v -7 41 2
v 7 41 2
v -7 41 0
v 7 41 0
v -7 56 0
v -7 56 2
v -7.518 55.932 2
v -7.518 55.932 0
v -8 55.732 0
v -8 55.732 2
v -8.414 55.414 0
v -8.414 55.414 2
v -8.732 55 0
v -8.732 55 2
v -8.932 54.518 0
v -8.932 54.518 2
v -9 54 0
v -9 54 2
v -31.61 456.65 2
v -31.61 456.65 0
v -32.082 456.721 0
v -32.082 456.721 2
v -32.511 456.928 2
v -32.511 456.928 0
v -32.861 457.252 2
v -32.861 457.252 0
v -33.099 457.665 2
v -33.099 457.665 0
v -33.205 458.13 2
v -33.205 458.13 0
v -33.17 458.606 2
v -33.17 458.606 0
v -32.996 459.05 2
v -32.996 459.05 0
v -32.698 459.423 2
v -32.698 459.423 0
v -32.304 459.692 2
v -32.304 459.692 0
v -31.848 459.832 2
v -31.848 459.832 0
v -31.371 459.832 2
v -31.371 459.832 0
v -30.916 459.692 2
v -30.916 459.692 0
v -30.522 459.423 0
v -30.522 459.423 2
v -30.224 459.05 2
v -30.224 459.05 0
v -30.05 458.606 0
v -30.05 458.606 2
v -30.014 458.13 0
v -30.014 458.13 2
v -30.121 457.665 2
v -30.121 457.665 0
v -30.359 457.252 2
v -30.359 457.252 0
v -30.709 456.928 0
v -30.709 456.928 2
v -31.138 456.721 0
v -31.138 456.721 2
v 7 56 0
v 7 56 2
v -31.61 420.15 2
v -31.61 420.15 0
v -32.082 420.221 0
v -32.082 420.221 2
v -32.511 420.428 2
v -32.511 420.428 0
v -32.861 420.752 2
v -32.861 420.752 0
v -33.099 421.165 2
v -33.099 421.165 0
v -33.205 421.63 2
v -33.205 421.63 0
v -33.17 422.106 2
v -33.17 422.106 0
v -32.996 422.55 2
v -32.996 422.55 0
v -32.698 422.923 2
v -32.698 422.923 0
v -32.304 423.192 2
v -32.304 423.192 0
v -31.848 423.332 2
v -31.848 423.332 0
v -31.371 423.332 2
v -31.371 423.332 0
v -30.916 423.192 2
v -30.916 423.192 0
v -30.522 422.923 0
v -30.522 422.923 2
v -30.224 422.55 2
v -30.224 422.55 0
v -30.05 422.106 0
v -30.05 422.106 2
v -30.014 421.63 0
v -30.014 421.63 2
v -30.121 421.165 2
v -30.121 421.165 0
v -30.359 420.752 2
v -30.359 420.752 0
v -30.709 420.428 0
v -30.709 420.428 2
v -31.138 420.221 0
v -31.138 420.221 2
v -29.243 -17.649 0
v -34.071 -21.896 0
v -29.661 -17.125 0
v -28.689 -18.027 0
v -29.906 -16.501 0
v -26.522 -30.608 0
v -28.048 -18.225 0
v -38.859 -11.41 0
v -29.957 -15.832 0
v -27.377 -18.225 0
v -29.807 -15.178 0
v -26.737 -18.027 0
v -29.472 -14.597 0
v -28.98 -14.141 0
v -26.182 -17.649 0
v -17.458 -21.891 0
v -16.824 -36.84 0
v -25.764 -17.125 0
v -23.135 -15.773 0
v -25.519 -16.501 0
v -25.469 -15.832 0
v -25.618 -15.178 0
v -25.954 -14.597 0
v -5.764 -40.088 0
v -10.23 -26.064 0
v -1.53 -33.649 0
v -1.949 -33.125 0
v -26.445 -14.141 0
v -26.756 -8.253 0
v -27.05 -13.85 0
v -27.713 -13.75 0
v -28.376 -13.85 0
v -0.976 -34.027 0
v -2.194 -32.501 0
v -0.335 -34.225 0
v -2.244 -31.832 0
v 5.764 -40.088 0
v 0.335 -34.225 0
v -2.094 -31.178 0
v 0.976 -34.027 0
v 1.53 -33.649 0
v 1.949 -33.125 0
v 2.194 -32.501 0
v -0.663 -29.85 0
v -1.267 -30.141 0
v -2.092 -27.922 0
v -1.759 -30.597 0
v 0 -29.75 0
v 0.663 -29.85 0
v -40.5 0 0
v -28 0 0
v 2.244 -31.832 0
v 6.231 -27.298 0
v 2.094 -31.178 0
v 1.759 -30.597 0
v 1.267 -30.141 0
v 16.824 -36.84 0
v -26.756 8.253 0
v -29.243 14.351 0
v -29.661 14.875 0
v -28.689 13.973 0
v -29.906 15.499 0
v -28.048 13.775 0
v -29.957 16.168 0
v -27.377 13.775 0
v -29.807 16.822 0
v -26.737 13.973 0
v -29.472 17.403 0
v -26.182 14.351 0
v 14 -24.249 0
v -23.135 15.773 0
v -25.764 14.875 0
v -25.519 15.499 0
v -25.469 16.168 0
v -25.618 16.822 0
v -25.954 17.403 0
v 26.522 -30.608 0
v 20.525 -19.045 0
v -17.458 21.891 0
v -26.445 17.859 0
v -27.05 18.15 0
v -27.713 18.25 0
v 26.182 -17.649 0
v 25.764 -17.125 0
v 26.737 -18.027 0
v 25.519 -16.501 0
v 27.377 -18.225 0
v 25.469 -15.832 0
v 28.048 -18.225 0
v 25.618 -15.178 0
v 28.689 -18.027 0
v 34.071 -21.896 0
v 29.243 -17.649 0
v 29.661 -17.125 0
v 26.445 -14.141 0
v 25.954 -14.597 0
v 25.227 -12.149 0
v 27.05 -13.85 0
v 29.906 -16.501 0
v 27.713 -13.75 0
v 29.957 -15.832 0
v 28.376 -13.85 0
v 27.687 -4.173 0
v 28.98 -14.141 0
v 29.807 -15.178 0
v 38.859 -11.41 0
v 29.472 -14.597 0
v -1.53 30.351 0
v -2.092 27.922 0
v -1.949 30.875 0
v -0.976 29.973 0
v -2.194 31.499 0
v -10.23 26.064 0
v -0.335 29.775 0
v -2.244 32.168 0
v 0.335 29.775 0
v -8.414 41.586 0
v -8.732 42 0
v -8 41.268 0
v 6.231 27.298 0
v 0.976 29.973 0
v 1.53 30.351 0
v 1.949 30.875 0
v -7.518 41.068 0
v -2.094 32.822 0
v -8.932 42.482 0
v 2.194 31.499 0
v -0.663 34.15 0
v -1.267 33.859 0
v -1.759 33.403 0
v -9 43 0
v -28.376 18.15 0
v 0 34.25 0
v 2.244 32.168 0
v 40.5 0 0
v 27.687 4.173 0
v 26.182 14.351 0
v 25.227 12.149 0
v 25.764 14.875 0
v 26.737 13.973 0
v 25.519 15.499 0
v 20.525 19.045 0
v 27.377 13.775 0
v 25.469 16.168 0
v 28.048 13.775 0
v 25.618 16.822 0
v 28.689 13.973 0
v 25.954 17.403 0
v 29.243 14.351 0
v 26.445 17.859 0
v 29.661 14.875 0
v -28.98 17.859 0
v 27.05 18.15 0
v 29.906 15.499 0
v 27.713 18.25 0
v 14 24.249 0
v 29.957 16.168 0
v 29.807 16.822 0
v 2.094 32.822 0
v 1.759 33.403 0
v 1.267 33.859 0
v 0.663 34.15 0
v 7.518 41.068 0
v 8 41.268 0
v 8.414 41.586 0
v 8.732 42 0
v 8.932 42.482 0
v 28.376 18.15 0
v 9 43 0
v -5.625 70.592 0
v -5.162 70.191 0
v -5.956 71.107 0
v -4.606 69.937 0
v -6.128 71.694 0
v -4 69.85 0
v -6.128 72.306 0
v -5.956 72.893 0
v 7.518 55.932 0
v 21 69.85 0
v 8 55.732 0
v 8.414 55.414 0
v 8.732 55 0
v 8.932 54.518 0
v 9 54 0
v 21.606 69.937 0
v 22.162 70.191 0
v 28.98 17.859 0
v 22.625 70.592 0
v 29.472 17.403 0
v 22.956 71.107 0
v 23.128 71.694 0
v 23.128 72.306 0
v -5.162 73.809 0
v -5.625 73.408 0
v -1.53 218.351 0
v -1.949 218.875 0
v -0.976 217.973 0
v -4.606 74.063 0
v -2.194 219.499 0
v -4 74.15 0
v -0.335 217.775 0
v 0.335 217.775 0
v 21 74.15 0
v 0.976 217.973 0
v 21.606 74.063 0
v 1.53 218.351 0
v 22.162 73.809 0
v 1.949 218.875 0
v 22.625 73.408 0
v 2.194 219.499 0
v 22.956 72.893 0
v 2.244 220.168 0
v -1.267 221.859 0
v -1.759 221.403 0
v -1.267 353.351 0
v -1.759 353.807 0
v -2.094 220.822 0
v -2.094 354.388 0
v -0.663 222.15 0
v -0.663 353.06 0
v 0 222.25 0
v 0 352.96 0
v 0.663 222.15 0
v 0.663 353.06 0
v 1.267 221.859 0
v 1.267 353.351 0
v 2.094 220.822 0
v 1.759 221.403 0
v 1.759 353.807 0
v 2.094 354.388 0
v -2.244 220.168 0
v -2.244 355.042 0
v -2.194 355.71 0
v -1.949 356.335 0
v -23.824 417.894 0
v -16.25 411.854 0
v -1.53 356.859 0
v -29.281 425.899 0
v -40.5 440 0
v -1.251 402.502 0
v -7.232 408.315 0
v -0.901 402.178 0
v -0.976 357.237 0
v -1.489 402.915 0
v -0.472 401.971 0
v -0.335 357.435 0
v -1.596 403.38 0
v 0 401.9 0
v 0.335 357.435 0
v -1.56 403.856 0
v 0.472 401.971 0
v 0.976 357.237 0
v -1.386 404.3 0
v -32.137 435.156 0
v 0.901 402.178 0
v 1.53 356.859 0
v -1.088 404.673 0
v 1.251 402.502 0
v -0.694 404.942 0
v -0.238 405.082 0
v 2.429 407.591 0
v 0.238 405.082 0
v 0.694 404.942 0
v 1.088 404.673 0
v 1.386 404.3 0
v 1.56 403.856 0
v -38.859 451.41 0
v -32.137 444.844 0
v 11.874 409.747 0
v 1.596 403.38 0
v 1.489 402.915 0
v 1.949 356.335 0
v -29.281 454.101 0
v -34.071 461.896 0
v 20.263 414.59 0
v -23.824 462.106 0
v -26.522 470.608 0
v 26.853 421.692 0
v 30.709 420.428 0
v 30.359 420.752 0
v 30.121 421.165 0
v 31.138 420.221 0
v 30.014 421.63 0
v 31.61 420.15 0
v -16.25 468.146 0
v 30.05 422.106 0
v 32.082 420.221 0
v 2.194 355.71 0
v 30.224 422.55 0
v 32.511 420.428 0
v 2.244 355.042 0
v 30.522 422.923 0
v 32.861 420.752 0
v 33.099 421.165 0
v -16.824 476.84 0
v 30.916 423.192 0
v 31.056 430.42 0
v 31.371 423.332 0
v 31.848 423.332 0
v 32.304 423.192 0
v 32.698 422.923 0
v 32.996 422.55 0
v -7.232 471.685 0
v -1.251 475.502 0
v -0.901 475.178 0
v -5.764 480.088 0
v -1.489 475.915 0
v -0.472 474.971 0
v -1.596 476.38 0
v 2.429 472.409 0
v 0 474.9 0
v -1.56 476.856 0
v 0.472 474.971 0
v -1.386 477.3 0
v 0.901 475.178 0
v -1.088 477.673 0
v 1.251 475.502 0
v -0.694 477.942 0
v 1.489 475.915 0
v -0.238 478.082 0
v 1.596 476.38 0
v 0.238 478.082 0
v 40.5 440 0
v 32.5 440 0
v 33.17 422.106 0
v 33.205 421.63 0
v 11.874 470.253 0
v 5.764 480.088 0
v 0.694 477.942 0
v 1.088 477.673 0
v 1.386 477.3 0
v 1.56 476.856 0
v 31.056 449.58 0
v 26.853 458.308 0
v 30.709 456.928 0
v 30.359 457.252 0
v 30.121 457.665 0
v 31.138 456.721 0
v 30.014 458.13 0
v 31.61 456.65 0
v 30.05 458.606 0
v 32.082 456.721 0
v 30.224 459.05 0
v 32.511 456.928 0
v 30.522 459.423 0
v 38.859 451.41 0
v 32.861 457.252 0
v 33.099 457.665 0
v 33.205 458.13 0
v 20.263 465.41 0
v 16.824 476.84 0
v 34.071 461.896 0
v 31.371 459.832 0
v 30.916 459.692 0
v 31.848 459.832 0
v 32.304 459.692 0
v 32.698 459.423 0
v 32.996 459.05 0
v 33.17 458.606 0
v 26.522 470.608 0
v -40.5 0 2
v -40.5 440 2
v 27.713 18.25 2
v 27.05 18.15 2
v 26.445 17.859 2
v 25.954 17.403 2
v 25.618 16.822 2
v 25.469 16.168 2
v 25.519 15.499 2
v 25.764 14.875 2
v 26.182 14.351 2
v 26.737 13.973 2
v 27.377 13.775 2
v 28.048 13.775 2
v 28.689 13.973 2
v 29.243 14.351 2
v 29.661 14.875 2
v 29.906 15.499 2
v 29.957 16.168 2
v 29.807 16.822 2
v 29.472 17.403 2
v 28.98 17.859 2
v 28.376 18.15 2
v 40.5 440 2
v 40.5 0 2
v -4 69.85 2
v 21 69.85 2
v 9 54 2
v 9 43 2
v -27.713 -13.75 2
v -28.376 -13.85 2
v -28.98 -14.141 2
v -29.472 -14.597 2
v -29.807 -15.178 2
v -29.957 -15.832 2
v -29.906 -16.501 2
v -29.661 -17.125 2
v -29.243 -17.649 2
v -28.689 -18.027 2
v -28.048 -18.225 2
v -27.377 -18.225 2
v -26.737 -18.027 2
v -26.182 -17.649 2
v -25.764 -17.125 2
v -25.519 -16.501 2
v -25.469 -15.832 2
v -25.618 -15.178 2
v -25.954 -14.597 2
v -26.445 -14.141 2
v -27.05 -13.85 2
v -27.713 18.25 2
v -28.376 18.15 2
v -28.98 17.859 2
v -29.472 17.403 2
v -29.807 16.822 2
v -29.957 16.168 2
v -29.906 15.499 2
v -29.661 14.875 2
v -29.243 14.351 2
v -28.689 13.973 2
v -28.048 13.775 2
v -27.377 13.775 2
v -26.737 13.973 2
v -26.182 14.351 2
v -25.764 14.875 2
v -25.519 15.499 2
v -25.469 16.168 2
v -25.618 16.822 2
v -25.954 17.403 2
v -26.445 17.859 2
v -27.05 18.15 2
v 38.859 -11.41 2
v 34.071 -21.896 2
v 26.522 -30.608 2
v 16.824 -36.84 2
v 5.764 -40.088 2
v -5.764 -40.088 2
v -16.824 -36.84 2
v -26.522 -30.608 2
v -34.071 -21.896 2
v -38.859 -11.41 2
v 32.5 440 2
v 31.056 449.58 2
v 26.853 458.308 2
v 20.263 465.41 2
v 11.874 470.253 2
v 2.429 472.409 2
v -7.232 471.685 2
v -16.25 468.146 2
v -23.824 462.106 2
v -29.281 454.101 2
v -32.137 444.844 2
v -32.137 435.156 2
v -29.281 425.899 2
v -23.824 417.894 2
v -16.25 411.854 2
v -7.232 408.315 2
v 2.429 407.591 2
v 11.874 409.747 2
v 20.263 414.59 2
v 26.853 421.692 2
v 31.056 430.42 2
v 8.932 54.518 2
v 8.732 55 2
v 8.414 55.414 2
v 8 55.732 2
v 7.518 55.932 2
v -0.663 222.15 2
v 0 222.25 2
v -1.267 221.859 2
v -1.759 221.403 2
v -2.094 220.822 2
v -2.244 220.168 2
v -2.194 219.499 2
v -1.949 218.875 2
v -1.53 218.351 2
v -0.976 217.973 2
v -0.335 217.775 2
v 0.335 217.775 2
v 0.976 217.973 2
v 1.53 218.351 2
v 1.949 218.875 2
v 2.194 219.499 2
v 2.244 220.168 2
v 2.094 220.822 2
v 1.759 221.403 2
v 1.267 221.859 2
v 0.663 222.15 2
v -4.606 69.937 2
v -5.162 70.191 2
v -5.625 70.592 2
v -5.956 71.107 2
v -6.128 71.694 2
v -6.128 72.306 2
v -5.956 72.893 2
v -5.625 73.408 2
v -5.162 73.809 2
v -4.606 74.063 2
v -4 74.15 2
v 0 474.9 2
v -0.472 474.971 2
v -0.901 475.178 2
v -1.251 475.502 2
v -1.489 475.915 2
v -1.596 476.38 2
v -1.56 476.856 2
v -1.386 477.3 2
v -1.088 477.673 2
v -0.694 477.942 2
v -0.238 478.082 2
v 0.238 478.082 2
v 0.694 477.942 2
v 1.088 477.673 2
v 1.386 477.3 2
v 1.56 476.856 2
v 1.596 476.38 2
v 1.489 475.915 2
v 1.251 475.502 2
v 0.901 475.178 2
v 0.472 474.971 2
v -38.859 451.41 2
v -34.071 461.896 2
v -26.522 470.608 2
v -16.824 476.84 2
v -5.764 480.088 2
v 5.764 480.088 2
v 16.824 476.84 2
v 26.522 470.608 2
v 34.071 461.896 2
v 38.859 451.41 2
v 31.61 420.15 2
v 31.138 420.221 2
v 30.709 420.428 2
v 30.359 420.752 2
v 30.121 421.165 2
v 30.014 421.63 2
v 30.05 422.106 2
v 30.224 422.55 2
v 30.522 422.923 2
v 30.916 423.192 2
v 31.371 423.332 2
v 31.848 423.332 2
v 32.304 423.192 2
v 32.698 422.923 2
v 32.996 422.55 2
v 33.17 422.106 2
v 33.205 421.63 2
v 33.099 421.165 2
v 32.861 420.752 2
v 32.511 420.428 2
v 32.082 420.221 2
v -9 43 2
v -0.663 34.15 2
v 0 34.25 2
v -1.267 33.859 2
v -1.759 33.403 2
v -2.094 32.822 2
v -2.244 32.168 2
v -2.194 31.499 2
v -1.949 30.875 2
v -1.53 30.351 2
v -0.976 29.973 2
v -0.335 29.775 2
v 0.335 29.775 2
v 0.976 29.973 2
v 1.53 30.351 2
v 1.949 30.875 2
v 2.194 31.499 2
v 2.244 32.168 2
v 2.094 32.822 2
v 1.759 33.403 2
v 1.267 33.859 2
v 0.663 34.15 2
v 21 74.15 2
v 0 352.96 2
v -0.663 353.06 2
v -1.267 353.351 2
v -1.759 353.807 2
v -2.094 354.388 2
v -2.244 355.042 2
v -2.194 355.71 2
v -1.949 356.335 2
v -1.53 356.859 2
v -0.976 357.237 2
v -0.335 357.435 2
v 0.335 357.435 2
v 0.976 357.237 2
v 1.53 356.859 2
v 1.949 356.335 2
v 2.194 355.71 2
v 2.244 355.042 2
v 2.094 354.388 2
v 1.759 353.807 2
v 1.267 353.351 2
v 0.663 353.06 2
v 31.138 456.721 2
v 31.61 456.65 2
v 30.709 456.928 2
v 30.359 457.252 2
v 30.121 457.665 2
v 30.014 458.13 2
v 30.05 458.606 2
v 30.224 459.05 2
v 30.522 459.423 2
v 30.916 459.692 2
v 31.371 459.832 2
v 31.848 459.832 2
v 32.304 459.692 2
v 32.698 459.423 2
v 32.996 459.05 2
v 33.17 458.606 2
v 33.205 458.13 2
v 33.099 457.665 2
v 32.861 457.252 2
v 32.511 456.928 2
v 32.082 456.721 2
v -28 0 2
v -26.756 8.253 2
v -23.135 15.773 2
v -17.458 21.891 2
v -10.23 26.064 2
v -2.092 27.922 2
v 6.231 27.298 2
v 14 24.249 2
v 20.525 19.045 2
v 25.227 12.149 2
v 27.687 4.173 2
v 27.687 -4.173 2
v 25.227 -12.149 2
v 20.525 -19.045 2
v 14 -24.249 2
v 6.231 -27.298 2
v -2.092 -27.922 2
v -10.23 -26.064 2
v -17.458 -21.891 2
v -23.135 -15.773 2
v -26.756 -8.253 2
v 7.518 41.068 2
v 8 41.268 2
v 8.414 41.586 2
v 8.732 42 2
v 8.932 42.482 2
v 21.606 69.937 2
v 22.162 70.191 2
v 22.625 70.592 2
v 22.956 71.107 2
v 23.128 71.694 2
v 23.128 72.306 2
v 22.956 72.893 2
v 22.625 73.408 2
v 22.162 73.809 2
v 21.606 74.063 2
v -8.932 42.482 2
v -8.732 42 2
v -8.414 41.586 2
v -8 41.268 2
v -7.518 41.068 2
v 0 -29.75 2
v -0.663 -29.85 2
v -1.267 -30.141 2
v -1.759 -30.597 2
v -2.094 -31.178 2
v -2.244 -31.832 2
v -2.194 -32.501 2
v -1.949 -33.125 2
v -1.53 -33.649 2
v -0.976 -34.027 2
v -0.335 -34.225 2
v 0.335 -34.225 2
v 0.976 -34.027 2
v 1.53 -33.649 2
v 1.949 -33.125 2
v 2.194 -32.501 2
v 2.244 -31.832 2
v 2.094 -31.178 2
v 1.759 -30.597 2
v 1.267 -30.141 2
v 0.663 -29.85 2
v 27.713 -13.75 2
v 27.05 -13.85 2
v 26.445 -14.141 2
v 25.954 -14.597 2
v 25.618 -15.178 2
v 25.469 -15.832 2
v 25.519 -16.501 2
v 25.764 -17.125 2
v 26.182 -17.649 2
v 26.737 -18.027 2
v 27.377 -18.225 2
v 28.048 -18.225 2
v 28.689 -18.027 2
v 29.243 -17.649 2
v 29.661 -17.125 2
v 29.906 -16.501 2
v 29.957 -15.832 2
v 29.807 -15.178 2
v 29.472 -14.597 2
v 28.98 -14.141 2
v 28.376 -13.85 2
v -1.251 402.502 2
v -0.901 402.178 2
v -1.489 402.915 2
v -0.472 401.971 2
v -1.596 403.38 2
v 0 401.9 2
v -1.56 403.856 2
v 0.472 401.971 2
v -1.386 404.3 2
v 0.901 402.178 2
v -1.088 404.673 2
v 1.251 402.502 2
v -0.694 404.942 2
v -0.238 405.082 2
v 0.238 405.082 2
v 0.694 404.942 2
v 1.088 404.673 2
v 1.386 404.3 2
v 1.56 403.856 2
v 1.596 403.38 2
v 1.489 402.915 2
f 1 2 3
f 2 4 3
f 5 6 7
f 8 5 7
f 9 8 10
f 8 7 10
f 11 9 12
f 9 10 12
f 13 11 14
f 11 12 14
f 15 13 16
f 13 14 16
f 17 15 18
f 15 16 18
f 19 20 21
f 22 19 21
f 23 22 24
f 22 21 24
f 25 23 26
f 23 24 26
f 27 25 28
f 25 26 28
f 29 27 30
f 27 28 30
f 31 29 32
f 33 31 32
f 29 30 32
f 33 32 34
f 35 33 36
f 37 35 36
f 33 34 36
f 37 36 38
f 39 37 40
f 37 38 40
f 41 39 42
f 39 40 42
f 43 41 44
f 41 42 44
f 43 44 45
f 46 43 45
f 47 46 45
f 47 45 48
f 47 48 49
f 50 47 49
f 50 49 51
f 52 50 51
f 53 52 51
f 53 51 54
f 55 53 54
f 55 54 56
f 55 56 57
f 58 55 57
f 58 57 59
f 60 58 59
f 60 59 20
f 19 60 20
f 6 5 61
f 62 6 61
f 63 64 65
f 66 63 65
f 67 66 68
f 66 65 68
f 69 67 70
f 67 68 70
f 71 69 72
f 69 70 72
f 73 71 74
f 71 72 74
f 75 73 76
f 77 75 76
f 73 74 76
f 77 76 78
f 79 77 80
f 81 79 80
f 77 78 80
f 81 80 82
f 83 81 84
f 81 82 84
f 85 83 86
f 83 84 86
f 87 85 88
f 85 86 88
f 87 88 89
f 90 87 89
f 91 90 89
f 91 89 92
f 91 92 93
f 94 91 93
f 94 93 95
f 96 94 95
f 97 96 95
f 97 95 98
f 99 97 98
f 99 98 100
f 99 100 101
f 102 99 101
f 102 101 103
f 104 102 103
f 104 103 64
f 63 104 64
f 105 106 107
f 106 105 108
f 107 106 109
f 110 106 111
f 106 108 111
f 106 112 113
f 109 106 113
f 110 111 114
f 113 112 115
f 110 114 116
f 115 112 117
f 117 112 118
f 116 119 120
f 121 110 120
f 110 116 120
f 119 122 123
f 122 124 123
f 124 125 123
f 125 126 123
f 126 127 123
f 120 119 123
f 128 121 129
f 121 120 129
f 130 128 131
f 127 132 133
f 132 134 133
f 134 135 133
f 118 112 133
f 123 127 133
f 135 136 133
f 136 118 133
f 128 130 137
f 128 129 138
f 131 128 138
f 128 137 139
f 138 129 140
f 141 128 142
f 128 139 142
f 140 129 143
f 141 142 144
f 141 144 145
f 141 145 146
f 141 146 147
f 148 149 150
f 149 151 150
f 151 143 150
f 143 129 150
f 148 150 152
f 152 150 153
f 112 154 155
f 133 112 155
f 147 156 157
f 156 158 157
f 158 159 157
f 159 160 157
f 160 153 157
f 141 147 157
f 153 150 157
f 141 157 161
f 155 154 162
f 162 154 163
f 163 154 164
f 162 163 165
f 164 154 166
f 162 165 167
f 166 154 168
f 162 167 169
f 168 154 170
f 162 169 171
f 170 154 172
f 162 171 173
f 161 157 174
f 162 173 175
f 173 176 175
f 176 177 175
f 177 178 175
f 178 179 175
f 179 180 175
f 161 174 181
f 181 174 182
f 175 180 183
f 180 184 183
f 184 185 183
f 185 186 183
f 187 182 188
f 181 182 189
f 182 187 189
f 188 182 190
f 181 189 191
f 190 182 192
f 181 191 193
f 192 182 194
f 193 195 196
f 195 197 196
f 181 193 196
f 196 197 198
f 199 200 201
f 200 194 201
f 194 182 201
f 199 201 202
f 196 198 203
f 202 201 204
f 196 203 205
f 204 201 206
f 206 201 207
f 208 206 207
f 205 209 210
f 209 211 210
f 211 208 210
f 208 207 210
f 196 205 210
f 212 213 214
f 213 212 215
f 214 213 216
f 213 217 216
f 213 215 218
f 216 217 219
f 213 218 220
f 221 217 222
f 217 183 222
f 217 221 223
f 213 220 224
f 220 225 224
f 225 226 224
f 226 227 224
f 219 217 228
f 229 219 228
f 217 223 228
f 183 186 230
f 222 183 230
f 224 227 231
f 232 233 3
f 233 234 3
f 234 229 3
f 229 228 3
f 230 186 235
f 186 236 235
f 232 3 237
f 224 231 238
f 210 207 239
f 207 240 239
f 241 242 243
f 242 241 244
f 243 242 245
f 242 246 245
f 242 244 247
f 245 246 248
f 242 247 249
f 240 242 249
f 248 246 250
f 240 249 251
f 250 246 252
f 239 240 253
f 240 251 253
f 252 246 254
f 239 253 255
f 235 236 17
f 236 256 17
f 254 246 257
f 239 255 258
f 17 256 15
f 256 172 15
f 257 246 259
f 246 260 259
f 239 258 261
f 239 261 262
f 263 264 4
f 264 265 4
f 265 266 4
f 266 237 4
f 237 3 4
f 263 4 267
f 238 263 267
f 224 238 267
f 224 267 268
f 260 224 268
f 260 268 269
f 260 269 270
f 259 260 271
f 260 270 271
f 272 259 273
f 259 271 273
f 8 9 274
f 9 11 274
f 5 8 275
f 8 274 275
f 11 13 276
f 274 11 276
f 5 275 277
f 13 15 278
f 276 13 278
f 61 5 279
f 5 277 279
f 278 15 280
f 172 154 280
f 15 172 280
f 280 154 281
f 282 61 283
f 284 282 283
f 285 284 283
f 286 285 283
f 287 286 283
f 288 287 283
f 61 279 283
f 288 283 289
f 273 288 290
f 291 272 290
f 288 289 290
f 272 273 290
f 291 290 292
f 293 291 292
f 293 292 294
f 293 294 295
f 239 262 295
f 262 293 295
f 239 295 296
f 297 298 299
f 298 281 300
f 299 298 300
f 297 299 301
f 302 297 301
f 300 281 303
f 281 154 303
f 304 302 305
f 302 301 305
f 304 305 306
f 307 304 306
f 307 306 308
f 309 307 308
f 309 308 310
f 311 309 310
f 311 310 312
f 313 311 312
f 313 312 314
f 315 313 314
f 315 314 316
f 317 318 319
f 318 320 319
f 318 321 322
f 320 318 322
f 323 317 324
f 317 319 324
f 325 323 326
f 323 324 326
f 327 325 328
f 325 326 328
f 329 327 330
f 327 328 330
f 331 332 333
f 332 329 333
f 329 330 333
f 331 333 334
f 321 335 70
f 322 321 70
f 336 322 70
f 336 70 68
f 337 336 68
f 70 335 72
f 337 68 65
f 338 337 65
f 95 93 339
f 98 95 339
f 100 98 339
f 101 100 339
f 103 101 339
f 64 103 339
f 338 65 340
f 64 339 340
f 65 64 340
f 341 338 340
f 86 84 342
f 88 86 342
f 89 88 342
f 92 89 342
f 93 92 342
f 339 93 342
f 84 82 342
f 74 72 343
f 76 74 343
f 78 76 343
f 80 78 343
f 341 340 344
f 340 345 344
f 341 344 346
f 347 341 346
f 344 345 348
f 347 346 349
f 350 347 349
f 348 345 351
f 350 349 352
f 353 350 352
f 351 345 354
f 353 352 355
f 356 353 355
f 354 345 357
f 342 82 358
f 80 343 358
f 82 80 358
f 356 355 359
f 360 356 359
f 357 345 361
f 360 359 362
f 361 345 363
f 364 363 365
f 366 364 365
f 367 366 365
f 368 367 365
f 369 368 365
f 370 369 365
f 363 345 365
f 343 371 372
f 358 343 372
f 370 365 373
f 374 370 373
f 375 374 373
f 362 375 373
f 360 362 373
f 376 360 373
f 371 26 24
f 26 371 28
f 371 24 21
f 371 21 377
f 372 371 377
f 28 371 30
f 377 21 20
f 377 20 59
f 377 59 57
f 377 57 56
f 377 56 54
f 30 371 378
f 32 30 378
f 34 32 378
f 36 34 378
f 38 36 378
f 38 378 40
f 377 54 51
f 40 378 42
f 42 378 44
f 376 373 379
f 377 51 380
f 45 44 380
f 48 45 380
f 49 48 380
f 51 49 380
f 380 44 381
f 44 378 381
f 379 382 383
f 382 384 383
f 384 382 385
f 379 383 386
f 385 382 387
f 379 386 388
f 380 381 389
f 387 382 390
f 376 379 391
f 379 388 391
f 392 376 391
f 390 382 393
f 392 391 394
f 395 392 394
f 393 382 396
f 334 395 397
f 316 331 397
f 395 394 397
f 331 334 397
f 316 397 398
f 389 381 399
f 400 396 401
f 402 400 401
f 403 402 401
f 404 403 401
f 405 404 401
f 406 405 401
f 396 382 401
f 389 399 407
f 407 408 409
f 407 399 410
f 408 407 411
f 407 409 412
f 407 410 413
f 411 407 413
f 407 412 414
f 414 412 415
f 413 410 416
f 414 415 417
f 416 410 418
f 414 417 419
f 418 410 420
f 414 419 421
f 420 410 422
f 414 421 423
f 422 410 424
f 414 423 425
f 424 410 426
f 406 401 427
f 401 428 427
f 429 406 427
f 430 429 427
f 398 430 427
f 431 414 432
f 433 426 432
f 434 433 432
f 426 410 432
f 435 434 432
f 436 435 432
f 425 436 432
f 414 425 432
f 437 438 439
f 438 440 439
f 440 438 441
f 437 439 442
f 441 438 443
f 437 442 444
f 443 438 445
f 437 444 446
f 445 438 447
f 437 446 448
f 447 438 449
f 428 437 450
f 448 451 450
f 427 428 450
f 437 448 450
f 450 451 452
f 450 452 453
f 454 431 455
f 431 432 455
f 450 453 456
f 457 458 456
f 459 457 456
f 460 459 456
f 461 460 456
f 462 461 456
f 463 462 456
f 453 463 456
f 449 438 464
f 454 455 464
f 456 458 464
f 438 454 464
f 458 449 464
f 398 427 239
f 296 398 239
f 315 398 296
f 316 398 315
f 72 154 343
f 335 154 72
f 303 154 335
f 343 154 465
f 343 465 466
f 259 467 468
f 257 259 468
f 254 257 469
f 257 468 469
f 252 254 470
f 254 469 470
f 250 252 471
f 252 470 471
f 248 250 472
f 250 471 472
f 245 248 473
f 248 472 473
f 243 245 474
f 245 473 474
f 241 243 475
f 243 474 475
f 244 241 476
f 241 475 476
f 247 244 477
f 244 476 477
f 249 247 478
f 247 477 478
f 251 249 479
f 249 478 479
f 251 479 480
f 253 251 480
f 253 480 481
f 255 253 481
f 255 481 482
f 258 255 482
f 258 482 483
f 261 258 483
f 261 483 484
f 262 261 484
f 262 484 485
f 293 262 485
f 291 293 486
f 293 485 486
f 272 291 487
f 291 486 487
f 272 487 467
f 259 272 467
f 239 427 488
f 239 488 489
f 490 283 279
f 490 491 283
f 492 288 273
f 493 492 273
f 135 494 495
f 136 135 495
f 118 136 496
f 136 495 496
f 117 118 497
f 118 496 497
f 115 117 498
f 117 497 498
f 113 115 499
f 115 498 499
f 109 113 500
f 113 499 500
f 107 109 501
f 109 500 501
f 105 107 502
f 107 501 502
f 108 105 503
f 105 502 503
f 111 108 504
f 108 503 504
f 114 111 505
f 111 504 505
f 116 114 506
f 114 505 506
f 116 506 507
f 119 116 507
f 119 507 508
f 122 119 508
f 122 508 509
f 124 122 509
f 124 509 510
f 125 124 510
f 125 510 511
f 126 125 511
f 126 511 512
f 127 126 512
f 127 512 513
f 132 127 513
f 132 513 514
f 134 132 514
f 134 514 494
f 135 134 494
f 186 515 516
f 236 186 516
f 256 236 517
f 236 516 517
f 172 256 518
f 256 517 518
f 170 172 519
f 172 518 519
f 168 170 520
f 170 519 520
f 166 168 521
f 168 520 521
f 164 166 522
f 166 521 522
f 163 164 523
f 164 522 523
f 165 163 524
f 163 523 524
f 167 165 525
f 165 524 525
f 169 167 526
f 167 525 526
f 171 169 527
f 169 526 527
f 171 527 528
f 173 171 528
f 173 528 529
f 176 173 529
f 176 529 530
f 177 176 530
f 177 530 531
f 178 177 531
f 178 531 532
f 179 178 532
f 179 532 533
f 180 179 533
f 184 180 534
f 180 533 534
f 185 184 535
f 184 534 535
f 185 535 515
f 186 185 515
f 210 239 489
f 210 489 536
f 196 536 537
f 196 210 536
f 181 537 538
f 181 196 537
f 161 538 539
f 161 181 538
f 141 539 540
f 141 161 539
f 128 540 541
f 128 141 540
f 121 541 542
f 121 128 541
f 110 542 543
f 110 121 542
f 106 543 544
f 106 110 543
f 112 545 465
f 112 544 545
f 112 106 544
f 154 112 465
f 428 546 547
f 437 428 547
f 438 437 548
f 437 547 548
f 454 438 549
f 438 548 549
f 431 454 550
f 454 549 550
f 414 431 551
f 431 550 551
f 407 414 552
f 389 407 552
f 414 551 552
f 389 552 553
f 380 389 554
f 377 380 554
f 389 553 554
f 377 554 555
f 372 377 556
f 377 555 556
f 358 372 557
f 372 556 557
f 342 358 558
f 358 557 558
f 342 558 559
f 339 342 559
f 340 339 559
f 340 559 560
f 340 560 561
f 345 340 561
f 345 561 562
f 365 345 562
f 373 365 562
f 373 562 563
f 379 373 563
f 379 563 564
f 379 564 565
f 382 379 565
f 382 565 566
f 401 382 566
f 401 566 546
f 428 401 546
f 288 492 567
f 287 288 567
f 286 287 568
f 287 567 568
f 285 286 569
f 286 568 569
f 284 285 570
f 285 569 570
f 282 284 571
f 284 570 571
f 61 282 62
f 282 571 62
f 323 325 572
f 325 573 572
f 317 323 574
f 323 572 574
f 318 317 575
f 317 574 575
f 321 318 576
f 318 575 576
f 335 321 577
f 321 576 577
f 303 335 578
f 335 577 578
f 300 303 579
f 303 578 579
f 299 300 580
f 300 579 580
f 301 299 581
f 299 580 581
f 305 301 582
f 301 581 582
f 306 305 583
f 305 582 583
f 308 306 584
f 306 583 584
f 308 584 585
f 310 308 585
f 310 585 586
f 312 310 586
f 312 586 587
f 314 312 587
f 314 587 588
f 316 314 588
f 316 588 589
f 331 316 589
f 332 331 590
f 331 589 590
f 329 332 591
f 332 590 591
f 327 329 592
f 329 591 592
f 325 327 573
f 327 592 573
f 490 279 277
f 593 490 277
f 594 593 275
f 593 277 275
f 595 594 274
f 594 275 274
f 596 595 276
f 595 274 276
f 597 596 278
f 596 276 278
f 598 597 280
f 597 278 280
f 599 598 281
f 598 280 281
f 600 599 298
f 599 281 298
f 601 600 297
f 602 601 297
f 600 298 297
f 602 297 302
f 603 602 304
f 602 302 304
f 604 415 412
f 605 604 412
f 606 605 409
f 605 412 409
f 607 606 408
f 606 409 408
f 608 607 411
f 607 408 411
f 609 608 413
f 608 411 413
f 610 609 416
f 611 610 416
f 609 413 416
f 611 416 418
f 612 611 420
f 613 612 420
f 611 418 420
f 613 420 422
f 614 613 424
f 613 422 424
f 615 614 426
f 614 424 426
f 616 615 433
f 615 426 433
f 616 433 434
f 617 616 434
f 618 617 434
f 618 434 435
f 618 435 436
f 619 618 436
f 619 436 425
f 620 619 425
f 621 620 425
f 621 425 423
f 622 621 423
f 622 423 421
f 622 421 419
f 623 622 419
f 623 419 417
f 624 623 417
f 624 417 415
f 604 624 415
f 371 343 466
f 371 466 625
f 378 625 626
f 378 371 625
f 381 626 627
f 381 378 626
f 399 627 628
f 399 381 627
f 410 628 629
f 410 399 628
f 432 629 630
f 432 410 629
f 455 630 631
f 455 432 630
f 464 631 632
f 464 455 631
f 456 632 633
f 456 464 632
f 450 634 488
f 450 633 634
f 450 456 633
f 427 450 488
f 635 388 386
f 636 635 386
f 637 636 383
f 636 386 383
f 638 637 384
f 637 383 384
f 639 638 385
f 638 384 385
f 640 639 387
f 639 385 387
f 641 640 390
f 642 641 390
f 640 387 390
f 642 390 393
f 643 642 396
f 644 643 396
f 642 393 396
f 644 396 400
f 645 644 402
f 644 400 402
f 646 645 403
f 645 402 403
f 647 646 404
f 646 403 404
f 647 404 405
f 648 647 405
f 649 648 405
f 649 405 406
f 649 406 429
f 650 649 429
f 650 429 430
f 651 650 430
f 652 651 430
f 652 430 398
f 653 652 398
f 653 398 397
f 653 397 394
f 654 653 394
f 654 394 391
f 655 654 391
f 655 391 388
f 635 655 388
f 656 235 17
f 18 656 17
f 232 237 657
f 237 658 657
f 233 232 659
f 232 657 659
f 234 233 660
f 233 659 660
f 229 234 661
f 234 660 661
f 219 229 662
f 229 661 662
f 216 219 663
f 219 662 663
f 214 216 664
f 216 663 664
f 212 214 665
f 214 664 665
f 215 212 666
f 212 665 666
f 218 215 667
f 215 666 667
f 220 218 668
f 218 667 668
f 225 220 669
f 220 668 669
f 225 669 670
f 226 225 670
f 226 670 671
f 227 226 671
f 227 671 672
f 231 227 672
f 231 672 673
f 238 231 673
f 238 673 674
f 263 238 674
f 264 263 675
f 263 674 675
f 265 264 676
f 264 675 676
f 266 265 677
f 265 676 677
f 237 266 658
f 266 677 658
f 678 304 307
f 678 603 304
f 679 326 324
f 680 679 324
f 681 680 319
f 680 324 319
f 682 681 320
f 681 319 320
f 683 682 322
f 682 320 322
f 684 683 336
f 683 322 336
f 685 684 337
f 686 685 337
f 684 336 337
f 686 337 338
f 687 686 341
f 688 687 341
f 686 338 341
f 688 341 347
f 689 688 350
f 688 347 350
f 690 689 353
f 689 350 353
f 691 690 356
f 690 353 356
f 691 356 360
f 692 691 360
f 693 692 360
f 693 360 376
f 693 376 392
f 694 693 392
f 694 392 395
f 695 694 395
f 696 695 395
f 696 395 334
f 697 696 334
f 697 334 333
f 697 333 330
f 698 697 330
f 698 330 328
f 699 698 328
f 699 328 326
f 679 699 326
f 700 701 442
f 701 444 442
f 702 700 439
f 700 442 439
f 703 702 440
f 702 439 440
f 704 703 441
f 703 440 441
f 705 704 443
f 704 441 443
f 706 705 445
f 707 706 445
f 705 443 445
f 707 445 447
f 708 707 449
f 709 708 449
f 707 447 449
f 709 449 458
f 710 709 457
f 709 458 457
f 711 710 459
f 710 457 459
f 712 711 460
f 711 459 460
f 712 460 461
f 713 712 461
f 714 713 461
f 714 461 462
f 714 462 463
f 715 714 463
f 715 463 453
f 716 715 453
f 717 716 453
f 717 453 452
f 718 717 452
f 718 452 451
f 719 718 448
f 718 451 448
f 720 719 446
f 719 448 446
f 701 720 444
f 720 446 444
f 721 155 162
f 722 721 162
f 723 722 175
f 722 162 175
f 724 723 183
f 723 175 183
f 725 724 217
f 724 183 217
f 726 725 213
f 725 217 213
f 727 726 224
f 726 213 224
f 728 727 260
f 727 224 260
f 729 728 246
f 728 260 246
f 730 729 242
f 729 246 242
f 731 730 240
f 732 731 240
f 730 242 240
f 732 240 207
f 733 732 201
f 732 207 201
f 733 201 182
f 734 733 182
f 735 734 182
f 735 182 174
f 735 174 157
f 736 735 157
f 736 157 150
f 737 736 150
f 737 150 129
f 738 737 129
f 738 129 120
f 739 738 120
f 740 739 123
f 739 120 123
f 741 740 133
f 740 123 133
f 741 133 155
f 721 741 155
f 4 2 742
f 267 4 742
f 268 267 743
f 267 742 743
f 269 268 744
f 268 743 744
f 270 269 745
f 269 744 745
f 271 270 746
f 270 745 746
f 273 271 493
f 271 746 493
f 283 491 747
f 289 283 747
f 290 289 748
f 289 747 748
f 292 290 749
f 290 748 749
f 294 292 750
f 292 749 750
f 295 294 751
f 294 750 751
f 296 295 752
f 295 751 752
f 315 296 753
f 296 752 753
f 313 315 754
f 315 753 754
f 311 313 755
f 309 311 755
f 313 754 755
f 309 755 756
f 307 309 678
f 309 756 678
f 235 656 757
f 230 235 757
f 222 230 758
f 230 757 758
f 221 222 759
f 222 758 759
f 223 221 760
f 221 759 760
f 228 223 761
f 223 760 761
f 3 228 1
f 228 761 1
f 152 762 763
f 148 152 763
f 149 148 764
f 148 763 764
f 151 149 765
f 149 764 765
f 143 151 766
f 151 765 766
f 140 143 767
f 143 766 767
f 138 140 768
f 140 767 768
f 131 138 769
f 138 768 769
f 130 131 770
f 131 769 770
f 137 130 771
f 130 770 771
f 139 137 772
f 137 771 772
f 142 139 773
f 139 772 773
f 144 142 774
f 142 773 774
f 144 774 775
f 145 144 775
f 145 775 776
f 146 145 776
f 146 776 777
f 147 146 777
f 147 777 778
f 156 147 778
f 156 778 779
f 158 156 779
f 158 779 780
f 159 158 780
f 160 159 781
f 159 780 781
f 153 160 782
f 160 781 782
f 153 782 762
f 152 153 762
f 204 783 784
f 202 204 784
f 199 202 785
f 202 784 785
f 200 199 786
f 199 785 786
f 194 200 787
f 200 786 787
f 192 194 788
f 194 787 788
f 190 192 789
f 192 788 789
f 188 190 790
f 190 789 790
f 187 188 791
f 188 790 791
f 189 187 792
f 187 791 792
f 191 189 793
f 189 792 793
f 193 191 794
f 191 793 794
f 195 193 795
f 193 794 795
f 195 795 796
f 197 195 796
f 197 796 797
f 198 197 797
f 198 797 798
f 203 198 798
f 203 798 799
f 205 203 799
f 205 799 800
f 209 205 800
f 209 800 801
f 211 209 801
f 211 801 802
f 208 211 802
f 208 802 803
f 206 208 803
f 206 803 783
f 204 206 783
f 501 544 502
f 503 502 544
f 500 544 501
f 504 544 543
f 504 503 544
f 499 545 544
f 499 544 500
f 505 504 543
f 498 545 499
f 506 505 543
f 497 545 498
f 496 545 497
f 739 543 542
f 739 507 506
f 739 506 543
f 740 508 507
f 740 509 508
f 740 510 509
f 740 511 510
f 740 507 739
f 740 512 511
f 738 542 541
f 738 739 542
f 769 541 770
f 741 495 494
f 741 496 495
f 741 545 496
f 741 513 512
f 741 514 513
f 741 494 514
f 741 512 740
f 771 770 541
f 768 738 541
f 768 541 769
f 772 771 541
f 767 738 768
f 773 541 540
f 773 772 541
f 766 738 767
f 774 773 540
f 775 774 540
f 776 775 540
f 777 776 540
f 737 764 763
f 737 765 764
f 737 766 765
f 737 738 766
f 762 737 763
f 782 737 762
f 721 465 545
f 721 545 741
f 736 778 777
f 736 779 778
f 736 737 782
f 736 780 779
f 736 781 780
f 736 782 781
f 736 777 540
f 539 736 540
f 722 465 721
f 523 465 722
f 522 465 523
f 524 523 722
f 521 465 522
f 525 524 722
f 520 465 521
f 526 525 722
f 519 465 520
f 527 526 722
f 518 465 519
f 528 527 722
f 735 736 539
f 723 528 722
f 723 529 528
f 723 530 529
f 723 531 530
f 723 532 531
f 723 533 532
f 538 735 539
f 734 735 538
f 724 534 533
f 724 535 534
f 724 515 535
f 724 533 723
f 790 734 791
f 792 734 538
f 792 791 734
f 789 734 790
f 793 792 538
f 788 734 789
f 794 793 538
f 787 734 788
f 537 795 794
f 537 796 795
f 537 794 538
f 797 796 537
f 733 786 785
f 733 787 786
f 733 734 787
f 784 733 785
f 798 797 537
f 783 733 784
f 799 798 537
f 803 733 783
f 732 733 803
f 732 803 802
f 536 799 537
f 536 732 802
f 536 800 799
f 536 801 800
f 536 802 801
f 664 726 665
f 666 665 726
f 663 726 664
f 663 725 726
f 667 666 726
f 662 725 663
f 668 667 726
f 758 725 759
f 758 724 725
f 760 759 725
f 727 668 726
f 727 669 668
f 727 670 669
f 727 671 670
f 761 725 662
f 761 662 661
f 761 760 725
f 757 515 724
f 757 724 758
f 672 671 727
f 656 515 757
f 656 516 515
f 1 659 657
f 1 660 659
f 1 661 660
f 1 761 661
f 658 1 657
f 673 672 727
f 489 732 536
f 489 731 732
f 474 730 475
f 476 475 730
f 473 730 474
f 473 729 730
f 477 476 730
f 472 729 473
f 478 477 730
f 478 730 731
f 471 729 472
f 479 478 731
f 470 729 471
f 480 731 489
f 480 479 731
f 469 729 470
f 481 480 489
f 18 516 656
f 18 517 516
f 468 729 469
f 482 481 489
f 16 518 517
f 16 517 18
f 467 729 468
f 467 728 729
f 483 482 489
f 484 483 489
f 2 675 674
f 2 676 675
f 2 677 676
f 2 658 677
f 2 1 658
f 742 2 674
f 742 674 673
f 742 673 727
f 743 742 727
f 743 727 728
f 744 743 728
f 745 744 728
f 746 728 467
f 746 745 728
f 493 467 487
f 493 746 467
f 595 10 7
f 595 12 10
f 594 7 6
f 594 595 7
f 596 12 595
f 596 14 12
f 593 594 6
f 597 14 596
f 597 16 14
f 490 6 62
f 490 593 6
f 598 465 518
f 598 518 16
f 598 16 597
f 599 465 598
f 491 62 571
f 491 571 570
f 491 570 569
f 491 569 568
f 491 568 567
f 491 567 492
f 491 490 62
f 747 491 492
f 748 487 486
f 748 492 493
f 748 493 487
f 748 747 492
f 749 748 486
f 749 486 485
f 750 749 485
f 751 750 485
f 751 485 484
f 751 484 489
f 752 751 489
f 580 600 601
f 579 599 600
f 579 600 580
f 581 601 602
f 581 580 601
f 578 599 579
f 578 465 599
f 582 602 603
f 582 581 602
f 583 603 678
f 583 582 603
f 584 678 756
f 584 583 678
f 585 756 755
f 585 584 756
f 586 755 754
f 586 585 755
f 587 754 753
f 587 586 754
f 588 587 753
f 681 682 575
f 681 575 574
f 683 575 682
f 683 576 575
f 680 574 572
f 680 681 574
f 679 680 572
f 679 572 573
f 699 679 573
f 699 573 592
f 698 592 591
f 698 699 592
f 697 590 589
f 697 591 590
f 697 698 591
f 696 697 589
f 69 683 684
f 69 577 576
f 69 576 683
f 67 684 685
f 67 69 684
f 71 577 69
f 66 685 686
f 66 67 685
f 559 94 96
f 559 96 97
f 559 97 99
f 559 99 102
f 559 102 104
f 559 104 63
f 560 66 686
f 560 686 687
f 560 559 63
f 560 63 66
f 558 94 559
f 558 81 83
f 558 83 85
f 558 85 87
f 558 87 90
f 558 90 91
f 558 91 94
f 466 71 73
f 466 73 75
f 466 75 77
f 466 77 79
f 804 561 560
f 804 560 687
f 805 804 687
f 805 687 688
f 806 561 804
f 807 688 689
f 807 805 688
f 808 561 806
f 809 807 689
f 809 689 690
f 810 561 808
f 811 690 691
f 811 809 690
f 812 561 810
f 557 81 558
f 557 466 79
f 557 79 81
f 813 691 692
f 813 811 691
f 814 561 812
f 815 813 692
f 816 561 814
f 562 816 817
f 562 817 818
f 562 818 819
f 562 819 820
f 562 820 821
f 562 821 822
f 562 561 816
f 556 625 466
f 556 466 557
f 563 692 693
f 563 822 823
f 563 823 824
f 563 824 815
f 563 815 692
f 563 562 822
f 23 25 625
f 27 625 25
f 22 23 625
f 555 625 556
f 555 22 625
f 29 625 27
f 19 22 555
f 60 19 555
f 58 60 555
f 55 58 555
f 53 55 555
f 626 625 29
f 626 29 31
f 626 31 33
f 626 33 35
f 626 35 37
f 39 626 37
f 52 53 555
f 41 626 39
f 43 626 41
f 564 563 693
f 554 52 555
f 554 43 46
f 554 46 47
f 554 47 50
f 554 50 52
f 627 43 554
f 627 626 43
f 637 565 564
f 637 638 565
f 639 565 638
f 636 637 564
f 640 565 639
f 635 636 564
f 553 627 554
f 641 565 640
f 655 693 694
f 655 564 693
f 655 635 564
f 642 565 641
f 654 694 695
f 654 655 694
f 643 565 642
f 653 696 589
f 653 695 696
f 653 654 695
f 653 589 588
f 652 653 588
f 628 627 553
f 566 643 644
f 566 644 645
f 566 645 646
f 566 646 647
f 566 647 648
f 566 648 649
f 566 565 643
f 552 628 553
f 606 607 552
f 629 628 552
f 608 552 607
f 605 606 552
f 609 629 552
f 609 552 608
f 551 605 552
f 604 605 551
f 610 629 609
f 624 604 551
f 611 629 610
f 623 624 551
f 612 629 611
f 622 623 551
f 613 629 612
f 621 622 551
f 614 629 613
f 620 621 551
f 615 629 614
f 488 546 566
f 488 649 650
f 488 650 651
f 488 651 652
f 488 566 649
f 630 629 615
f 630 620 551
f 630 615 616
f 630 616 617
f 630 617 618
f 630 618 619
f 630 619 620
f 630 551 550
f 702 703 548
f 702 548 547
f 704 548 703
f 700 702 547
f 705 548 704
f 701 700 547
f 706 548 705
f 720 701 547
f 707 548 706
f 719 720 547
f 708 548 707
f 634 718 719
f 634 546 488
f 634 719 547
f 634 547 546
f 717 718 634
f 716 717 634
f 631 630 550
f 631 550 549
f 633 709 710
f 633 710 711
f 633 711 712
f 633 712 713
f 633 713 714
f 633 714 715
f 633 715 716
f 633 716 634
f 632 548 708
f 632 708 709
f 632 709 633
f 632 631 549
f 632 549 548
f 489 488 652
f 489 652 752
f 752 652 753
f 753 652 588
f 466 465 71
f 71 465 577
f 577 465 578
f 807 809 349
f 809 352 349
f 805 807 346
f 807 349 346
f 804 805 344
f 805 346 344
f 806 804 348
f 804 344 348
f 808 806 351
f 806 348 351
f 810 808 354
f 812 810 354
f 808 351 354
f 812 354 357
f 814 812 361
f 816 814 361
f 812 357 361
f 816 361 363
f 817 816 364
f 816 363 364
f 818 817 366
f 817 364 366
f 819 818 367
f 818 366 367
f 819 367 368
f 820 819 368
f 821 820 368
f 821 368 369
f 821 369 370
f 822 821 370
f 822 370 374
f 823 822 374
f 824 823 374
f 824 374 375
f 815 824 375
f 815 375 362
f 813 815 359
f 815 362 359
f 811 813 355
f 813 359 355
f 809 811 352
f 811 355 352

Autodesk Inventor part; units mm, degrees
ref_plane "YZ Plane" through (0, 0, 0) normal (1, 0, 0) x (0, 1, 0)
ref_plane "XZ Plane" through (0, 0, 0) normal (0, 1, 0) x (-1, 0, 0)
ref_plane "XY Plane" through (0, 0, 0) normal (0, 0, 1) x (1, 0, 0)
sketch "スケッチ1" plane through (0, 0, 0) normal (0, 0, 1) x (1, 0, 0)
  circle A0 centre (0, 0) radius 40.5
  circle A1 centre (0, 440) radius 40.5
  line L0 (-40.5, 0) -> (-40.5, 440)
  line L1 (40.5, 440) -> (40.5, 0)
  dimension "d0" = 81
  dimension "d1" = 81
  dimension "d2" = 440
extrude "プレート1" add sketch "スケッチ1" along normal blind 2
sketch "スケッチ4" plane through (0, 0, 0) normal (0, 0, -1) x (-1, 0, 0)
  circle A0 centre (0, 0) radius 28
  dimension "d28" = 56
extrude "押し出し1" cut sketch "スケッチ4" against normal blind 10
sketch "スケッチ5" plane through (0, 0, 0) normal (0, 0, -1) x (-1, 0, 0)
  circle A0 centre (0, 0) radius 32
  point P0 (0, 32)
  point P1 (-27.7128, 16)
  point P2 (-27.7128, -16)
  point P3 (0, -32)
  point P4 (27.7128, -16)
  point P5 (27.7128, 16)
  dimension "d31" = 64
  dimension "d34" = 360
hole "穴3" at (0, 32, 0) at (27.7128, 16, 0) at (27.7128, -16, 0) at (0, -32, 0) at (-27.7128, -16, 0) at (-27.7128, 16, 0) direction (0, 0, 1) diameter 4.5 end through all clearance for "Flat Head Machine Screw" size "M4" standard "Ansi Metric M Profile"
sketch "スケッチ6" plane through (0, 0, 2) normal (0, 0, 1) x (1, 0, 0)
  arc A0 (40.5, 440) -> (-40.5, 440) centre (0, 440) ccw projected
  circle A1 centre (0, 440) radius 32.5
  point P0 (0, 0)
  dimension "d43" = 65
extrude "押し出し2" cut sketch "スケッチ6" against normal blind 10
sketch "スケッチ9" plane through (0, 0, 2) normal (0, 0, 1) x (1, 0, 0)
  arc A0 (40.5, 440) -> (-40.5, 440) centre (0, 440) ccw projected
  circle A1 centre (0, 440) radius 36.5
  point P0 (0, 0)
  point P1 (0, 476.5)
  point P2 (-31.6099, 458.25)
  point P3 (-31.6099, 421.75)
  point P4 (0, 403.5)
  point P5 (31.6099, 421.75)
  point P6 (31.6099, 458.25)
  dimension "d58" = 73
  dimension "d61" = 360
hole "穴5" at (0, 476.5, 2) at (-31.6099, 458.25, 2) at (-31.6099, 421.75, 2) at (0, 403.5, 2) at (31.6099, 421.75, 2) at (31.6099, 458.25, 2) direction (0, 0, -1) diameter 3.2 end through all clearance for "Socket Head Cap Screw" size "M3" standard "Ansi Metric M Profile"
sketch "スケッチ16" plane through (0, 0, 2) normal (0, 0, 1) x (1, 0, 0)
  circle A0 centre (0, 355.2097) radius 4
  arc A1 (40.5, 440) -> (-40.5, 440) centre (0, 440) ccw projected
  circle A2 centre (0, 440) radius 25
  line L0 (-23.4923, 431.4495) -> (4.1883, 355.3977)
  line L1 (0, 603.9) -> (0, -147.9) projected
  point P0 (0, 0)
  dimension "d154" = 50
  dimension "d135" = 8
  dimension "d136" = 0
  dimension "d137" = 160
hole "穴11" at (0, 355.2097, 2) direction (0, 0, -1) diameter 4.5 end through all clearance for "Flat Head Machine Screw" size "M4" standard "Ansi Metric M Profile"
sketch "スケッチ17" plane through (0, 0, 2) normal (0, 0, 1) x (1, 0, 0)
  circle A0 centre (0, 0) radius 44
  point P0 (-4, 72)
  dimension "d145" = 88
  dimension "d177" = 72
  dimension "d178" = 4
hole "穴12" at (-4, 72, 2) direction (0, 0, -1) diameter 4.3 end through all clearance for "Flat Head Machine Screw" size "M4" standard "Ansi Metric M Profile"
sketch "スケッチ18" plane through (0, 0, 0) normal (0, 0, -1) x (-1, 0, 0)
  line L0 (-9, 41) -> (9, 41)
  line L1 (9, 41) -> (9, 56)
  line L2 (9, 56) -> (-9, 56)
  line L3 (-9, 56) -> (-9, 41)
  line L4 (-9, 41) -> (9, 56) construction
  line L5 (9, 41) -> (-9, 56) construction
  arc A0 (40.5, 440) -> (-40.5, 440) centre (0, 440) ccw projected
  point P0 (0, 0)
  point P1 (0, 48.5)
  point P2 (0, 48.5)
  dimension "d157" = 18
  dimension "d158" = 15
  dimension "d183" = 41
extrude "押し出し4" cut sketch "スケッチ18" against normal blind 10
fillet "コーナーR2" radius 2 4 edges at (-9, 56, 1) (9, 56, 1) (9, 41, 1) (-9, 41, 1)
sketch "スケッチ19" plane through (0, 0, 2) normal (0, 0, 1) x (1, 0, 0)
  line L0 (21, 72) -> (-4, 72) construction
  line L1 (21, 69.85) -> (-4, 69.85)
  line L2 (-4, 74.15) -> (21, 74.15)
  arc A0 (21, 69.85) -> (21, 74.15) centre (21, 72) ccw
  arc A1 (-4, 74.15) -> (-4, 69.85) centre (-4, 72) ccw
  circle A2 centre (-4, 72) radius 2.15 projected
  point P0 (0, 0)
  point P1 (8.5, 72)
  dimension "d182" = 21
extrude "押し出し5" cut sketch "スケッチ19" against normal blind 10
sketch "スケッチ20" plane through (0, 0, 0) normal (0, 0, -1) x (-1, 0, 0)
  point P0 (0, 0)
  point P1 (0, 220)
  dimension "d167" = 220
hole "穴13" at (0, 220, 0) direction (0, 0, 1) diameter 4.5 end through all clearance for "Flat Head Machine Screw" size "M4" standard "Ansi Metric M Profile"
equation "\"d41\" = Thickness"
equation "\"d68\" = Thickness"
equation "\"d143\" = Thickness"
equation "\"d152\" = Thickness"
equation "\"d173\" = Thickness"
equation "\"d3\" = Thickness"
equation "\"BendRadius\" = Thickness"
equation "\"BendReliefWidth\" = Thickness"
equation "\"BendReliefDepth\" = 0.5 * Thickness"
equation "\"CornerReliefSize\" = 4 * Thickness"
equation "\"MinimumRemnant\" = 2 * Thickness"
equation "\"TransitionRadius\" = BendRadius"
equation "\"JacobiRadiusSize\" = Thickness"
equation "\"GapSize\" = Thickness"
equation "\"Thickness\" = 2"
properties part number "link2-plate2" material "CFRP"
